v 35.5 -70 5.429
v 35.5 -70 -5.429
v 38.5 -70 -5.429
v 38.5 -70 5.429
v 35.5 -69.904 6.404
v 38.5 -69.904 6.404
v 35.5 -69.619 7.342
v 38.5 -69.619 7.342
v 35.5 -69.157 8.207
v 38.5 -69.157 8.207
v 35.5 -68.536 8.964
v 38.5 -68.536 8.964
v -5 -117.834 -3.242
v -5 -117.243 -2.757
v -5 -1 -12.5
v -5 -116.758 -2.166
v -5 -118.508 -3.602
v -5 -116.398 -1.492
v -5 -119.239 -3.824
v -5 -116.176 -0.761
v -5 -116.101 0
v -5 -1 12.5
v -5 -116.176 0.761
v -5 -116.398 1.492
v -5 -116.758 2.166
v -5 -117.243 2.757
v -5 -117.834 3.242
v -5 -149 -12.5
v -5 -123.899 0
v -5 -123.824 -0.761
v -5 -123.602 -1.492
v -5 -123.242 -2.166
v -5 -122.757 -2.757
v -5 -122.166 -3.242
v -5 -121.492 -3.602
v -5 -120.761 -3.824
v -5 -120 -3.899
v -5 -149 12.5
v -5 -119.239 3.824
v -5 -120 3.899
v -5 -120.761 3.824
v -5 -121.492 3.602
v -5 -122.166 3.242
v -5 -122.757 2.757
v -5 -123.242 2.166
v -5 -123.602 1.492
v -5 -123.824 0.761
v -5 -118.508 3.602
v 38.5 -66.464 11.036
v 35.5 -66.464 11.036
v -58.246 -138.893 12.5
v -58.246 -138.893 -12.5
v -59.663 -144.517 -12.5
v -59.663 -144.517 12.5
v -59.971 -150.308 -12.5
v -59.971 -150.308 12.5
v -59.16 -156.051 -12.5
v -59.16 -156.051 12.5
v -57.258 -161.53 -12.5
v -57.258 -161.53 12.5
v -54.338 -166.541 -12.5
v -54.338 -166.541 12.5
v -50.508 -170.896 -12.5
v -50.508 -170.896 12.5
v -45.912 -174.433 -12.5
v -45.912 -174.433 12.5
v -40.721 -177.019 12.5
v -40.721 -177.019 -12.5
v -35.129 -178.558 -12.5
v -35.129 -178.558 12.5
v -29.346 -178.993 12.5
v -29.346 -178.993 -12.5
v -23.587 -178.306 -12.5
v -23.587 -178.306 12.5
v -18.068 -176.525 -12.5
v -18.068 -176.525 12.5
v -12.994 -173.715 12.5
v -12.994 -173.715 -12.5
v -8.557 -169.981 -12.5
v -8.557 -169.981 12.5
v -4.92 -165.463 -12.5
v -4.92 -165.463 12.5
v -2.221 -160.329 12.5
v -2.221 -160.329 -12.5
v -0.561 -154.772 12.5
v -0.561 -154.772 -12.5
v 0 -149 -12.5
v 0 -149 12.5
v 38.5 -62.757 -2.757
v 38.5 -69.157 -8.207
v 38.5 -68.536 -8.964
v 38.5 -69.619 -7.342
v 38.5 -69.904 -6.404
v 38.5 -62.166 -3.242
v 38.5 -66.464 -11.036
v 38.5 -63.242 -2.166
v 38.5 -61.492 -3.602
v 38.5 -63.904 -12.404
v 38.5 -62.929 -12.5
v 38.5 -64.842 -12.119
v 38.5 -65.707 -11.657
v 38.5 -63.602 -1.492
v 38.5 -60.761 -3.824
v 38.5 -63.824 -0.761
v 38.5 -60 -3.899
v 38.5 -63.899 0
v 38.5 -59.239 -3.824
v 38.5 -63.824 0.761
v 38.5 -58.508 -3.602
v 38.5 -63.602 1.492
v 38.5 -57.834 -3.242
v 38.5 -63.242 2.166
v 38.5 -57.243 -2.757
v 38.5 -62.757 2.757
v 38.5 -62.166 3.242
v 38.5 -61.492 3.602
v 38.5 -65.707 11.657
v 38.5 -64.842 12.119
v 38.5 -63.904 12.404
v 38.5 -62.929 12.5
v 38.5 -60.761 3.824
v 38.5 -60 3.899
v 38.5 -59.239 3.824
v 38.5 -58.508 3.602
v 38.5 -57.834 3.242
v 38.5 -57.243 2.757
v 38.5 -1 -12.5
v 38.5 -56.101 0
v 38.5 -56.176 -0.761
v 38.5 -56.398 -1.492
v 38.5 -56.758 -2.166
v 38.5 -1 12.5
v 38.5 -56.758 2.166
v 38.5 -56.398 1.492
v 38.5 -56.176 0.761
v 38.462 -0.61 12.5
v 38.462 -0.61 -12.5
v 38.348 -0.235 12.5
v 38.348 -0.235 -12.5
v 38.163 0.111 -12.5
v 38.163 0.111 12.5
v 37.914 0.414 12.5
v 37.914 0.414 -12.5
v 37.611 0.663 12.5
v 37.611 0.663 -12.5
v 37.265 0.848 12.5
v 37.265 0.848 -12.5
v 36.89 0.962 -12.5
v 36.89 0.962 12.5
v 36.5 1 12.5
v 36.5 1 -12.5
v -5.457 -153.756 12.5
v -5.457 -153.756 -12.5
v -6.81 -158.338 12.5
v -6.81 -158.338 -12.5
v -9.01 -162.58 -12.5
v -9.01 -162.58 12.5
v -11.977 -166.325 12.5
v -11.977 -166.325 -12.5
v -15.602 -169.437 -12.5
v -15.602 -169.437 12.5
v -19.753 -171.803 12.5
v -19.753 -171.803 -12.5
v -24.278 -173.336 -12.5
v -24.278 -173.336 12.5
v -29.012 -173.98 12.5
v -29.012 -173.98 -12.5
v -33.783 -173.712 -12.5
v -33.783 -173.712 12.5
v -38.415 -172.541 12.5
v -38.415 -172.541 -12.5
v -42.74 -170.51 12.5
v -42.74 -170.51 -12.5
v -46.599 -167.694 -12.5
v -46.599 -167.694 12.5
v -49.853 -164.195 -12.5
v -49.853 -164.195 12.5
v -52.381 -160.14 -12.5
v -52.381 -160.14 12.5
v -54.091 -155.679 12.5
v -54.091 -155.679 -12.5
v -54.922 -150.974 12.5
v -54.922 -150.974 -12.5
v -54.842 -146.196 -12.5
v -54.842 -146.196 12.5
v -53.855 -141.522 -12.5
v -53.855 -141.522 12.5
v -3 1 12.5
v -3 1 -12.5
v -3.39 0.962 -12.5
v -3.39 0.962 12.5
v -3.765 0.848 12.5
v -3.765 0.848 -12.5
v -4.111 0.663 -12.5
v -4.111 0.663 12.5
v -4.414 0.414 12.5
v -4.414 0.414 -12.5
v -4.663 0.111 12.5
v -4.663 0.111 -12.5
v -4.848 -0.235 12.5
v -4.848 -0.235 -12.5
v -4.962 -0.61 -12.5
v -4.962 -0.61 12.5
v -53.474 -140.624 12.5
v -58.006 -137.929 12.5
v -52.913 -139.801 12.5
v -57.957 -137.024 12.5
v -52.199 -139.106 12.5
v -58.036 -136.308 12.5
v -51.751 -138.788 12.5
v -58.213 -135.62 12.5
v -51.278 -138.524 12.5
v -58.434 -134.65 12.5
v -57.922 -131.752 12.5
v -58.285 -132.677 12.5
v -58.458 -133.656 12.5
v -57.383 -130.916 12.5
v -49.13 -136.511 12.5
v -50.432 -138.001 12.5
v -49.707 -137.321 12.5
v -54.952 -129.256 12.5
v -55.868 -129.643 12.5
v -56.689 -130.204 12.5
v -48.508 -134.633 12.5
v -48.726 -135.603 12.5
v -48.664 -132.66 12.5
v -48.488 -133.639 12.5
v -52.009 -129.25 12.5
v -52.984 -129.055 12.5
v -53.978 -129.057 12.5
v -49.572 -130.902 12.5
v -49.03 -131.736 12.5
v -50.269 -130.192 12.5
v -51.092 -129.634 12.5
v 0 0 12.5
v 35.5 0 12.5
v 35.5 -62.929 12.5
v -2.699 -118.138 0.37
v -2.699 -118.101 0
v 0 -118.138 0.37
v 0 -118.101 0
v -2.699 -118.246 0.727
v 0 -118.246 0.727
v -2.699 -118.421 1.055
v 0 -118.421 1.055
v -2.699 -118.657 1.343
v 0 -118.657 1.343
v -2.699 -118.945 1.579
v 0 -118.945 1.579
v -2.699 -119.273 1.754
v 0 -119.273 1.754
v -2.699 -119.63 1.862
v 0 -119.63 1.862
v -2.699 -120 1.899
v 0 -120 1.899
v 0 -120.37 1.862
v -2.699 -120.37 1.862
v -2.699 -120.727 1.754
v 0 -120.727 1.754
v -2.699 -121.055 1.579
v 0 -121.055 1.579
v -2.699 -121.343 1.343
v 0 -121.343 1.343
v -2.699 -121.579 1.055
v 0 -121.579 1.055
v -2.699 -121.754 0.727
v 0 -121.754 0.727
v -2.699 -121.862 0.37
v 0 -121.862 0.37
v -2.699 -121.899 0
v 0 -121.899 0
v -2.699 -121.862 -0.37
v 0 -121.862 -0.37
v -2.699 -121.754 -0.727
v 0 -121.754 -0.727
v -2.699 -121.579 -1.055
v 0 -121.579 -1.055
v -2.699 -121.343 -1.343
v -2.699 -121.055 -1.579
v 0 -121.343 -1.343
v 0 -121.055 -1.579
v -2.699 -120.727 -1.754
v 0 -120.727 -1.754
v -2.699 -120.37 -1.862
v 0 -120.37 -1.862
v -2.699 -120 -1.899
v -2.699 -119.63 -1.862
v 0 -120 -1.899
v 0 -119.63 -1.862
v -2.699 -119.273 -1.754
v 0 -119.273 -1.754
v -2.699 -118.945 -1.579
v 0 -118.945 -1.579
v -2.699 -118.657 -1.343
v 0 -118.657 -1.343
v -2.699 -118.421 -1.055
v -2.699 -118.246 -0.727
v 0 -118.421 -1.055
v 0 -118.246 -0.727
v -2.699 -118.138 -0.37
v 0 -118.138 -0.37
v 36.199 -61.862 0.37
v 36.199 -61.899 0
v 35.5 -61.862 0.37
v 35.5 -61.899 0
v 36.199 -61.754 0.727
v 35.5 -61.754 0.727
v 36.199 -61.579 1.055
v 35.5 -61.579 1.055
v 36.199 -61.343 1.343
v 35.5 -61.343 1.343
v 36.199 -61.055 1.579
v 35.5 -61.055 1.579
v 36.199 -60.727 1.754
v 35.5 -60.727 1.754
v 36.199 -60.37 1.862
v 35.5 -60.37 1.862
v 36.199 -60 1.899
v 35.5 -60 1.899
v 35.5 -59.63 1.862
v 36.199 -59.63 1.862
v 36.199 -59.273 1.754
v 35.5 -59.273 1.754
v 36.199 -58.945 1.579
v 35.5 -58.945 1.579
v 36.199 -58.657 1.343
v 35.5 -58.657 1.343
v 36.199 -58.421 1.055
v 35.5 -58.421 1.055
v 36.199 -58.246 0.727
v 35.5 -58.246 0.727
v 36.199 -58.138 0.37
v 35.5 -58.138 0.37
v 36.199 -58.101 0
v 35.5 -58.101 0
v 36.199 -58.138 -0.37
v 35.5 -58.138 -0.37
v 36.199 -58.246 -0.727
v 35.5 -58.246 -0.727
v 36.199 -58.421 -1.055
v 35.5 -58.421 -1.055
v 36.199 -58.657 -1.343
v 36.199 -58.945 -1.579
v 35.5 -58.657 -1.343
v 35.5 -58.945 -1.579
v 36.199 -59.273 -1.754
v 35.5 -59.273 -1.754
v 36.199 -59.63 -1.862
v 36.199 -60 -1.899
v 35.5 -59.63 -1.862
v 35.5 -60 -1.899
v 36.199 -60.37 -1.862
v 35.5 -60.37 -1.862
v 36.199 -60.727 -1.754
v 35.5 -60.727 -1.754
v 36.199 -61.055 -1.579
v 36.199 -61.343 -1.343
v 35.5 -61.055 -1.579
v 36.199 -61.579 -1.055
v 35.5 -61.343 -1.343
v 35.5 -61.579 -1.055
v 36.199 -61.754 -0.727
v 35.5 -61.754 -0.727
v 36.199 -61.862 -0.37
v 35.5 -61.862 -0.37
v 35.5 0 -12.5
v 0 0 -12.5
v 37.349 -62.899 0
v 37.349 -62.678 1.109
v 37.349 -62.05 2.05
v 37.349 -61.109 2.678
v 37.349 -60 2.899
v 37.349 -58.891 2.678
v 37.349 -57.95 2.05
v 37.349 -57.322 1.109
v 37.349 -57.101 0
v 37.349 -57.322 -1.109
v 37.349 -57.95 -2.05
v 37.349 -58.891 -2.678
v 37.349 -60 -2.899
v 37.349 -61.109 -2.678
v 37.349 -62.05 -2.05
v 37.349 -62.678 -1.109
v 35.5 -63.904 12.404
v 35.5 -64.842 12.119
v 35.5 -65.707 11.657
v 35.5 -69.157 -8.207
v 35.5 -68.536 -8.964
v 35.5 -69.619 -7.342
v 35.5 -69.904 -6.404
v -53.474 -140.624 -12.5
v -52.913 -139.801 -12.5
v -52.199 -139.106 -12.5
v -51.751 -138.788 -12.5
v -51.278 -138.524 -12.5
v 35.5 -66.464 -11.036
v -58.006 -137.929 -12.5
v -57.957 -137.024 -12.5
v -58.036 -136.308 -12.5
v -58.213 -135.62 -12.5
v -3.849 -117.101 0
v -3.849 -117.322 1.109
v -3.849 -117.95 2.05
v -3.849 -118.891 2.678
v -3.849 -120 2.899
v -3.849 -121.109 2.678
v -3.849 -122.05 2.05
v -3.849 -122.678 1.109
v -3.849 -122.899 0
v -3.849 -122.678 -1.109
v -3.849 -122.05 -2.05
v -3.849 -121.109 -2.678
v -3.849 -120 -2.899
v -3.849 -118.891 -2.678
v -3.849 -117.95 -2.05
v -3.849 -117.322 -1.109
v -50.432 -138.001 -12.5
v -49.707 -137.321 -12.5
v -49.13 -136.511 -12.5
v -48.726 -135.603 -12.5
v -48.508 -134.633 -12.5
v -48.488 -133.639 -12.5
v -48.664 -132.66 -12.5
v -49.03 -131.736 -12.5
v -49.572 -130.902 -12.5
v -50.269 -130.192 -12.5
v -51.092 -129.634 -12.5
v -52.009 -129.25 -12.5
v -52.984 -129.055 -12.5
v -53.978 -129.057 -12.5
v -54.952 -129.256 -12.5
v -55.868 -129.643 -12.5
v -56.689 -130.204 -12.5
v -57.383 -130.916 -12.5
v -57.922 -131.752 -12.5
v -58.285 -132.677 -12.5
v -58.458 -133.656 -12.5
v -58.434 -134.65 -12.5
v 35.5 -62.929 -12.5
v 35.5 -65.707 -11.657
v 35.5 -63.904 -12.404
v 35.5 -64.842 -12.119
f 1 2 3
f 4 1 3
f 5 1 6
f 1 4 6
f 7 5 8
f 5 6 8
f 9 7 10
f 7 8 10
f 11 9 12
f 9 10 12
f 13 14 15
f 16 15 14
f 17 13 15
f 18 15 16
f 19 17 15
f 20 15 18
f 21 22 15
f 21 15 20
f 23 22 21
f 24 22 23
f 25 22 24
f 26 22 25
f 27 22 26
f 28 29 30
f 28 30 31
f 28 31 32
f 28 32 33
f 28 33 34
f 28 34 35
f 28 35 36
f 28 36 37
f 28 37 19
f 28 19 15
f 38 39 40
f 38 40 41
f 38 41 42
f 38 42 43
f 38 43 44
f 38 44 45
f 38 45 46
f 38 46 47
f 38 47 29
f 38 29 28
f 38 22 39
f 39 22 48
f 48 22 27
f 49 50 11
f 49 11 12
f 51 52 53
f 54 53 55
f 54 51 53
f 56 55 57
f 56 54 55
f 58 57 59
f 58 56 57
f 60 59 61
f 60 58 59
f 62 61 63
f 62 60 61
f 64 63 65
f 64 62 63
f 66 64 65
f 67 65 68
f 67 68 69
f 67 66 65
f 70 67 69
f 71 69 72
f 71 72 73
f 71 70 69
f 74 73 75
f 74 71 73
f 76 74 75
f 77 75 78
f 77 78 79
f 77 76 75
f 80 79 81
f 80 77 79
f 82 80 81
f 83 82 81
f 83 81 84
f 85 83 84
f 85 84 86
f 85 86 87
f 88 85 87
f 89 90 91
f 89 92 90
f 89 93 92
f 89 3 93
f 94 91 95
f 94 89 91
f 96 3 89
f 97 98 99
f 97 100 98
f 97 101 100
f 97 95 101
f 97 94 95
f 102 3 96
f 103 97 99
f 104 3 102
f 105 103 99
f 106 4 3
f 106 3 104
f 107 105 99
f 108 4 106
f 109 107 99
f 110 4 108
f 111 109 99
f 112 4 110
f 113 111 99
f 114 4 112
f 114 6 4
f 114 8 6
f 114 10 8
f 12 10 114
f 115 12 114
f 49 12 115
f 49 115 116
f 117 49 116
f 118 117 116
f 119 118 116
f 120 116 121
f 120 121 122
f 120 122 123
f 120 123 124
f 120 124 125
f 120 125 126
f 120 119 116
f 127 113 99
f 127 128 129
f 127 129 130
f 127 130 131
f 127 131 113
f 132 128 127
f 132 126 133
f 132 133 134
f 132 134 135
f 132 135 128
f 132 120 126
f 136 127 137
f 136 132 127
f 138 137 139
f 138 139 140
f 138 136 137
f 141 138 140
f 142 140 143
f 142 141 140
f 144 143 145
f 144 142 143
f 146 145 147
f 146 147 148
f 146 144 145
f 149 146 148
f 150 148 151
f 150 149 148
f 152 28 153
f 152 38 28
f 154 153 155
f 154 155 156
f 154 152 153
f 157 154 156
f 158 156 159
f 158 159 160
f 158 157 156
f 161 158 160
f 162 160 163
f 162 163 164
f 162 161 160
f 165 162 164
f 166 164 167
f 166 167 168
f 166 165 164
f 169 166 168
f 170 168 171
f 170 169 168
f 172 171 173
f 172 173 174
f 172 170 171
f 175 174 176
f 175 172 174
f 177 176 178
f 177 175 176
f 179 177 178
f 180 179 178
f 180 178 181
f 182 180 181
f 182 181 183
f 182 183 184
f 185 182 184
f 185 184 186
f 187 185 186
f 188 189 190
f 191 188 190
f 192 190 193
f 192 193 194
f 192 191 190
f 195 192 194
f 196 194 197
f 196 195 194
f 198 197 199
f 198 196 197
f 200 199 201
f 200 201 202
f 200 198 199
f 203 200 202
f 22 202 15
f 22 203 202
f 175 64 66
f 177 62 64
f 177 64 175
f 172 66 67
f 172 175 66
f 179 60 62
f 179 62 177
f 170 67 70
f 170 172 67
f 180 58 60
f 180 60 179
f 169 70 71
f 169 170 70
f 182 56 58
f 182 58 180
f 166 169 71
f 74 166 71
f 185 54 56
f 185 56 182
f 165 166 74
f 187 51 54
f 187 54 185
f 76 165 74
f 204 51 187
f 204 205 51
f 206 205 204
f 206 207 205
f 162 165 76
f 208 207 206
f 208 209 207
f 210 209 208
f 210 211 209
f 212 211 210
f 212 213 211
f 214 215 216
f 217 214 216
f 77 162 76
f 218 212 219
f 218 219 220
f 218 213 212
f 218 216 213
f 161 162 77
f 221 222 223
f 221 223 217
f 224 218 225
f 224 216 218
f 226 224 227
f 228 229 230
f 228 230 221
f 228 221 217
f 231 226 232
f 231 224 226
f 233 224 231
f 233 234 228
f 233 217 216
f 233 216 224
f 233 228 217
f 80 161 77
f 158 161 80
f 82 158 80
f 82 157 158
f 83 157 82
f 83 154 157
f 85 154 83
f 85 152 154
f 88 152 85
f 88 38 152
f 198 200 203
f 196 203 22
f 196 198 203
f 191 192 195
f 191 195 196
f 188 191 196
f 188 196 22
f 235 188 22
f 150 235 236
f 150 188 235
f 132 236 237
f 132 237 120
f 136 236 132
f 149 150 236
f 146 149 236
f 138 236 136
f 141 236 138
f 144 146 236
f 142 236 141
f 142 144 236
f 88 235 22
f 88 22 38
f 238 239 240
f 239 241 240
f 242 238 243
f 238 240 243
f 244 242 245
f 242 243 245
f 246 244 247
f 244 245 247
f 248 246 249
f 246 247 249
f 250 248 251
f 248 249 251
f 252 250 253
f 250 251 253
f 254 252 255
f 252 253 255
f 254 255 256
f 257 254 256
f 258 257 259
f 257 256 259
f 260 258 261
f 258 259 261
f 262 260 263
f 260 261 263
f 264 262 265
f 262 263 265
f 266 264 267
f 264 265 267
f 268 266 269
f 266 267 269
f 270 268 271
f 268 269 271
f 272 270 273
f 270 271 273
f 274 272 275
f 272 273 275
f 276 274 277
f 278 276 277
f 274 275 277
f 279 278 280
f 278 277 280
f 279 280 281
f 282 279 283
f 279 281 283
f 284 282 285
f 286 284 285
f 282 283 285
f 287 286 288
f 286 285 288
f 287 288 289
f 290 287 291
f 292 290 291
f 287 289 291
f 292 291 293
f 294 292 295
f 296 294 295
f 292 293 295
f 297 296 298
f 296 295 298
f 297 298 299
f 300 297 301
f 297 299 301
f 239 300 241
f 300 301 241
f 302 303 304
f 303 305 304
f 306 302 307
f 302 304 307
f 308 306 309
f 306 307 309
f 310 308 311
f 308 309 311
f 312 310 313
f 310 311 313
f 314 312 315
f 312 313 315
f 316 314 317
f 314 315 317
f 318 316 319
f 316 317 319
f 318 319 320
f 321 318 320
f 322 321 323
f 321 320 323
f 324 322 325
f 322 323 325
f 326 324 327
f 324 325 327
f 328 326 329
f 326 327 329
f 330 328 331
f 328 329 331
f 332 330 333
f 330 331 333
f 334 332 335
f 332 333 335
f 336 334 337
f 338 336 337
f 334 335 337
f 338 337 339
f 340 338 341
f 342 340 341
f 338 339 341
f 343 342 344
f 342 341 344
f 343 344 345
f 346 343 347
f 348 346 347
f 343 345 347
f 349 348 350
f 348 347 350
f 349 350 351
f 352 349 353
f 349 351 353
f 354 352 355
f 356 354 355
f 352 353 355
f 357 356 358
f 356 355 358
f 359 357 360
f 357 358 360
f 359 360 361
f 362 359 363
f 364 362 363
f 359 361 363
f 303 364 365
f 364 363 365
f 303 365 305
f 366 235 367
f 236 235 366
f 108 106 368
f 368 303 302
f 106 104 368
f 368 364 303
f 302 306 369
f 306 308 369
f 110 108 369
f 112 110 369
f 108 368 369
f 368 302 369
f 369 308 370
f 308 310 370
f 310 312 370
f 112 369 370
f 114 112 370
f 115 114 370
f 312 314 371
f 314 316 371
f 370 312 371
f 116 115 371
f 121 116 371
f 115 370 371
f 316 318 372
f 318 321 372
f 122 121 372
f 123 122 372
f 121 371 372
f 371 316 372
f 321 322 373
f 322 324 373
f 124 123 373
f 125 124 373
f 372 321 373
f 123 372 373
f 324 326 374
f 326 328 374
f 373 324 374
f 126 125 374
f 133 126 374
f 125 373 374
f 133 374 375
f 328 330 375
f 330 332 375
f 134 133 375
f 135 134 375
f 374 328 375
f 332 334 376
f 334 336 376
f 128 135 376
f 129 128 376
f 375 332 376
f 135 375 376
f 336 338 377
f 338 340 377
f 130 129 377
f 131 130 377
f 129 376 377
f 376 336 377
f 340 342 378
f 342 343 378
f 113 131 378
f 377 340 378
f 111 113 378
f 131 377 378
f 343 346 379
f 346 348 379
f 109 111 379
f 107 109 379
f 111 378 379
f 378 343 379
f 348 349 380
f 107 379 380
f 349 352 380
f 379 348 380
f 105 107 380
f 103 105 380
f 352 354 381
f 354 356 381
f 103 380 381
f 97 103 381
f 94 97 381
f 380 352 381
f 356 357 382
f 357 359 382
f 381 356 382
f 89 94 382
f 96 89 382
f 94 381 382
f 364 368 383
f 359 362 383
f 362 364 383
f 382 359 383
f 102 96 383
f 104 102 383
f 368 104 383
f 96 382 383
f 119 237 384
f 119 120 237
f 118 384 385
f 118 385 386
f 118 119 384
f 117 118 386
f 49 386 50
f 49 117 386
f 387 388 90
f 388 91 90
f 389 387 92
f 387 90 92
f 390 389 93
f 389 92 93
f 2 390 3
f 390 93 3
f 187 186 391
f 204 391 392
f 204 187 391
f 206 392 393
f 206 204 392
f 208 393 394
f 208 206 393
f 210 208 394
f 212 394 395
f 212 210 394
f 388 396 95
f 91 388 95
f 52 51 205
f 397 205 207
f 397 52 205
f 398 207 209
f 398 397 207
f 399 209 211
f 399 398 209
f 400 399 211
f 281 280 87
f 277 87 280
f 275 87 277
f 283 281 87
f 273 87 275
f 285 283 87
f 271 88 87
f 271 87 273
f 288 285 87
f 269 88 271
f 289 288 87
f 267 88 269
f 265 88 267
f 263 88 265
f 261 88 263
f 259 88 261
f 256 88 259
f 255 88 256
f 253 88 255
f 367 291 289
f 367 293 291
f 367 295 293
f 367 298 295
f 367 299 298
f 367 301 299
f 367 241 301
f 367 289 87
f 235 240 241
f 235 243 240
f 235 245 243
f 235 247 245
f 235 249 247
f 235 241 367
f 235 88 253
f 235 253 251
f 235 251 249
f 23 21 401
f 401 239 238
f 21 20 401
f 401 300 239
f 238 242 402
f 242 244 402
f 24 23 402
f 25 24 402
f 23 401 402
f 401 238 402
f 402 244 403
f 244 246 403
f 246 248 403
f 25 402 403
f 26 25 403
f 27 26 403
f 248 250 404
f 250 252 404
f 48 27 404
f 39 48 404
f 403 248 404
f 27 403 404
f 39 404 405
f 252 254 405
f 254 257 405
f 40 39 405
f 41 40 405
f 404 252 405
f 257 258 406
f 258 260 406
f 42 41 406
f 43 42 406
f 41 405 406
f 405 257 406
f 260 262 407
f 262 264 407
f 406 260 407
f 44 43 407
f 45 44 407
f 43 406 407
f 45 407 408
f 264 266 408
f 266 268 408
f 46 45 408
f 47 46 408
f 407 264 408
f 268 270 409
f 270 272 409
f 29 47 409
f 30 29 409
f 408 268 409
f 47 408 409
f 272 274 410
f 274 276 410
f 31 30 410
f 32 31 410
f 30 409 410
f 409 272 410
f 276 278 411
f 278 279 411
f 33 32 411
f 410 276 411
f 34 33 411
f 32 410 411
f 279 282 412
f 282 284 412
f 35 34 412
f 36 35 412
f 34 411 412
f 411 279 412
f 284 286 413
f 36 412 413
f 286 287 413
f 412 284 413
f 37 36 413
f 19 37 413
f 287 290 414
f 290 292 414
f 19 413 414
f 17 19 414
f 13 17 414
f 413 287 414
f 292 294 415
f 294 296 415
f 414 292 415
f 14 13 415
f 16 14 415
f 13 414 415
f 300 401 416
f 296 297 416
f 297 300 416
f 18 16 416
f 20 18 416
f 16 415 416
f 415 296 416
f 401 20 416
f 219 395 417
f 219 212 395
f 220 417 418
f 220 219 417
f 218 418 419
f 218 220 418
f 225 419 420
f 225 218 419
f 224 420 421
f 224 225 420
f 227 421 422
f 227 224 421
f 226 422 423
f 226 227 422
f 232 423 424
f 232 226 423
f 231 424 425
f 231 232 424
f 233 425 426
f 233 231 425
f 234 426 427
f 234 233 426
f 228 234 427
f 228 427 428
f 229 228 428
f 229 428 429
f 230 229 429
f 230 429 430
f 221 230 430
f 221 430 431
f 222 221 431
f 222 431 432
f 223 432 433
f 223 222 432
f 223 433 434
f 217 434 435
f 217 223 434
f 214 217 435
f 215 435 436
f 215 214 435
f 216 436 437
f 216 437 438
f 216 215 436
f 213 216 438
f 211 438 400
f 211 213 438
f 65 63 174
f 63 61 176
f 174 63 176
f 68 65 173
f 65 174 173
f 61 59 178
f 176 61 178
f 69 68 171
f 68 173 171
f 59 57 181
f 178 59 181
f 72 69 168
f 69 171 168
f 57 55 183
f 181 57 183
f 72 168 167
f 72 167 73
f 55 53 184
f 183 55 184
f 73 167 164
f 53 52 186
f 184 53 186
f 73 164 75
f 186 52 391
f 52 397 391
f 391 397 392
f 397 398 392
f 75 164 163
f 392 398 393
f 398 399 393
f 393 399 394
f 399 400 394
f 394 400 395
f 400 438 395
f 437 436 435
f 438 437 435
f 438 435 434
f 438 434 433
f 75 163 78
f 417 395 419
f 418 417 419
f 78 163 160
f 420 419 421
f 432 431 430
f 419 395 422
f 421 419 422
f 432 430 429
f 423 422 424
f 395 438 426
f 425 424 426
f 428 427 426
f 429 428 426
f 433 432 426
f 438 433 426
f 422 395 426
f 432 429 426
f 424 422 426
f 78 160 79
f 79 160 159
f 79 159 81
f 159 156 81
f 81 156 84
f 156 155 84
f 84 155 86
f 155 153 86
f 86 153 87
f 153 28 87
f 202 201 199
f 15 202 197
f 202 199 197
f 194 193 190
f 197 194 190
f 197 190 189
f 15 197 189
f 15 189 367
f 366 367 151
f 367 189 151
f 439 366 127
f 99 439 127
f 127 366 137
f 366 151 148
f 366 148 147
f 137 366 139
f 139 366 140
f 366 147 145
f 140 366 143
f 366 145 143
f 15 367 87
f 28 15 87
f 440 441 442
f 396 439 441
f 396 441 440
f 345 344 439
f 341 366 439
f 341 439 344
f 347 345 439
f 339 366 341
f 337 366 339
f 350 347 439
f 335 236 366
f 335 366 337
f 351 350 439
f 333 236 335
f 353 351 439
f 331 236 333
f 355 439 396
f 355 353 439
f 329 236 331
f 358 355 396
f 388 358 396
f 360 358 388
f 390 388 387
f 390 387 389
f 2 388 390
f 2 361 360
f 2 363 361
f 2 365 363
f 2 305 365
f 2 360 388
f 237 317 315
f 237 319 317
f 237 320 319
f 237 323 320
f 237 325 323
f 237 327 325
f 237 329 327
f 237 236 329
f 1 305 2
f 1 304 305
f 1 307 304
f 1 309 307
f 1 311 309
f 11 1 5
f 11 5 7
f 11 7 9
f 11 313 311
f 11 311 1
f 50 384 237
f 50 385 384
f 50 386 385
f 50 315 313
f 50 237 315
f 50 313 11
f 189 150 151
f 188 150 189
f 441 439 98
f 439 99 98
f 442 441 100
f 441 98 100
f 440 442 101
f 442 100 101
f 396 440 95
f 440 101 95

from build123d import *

# Parameters (mm, degrees)
F1_DEPTH             = 12.5
F2_SIZE              = 5
F3_R                 = 2
F4_R                 = 5
F6_R                 = 5
F8_D                 = 3.7973
F8_DEPTH             = 12.62
F8_CSINK_D           = 7.7978
F8_CSINK_ANGLE       = 82
F8_TIP               = 1.1408240143
F8_ON_F7_D           = 3.7973
F8_ON_F7_DEPTH       = 12.62
F8_ON_F7_CSINK_D     = 7.7978
F8_ON_F7_CSINK_ANGLE = 82
F8_ON_F7_TIP         = 1.1408240143


with BuildPart() as f1:
    # F0 (on Top) → F1 (new body, symmetric)
    with BuildSketch(Plane.XY):
        with BuildLine():
            Line((0, 0), (35.5, 0))
            Line((35.5, 0), (35.5, -70))
            Line((35.5, -70), (38.5, -70))
            Line((38.5, -70), (38.5, 1))
            Line((38.5, 1), (-5, 1))
            Line((-5, 1), (-5, -149))
            ThreePointArc((-5, -149), (-35.1077410922, -173.4726578233), (-52.9128784748, -139))
            ThreePointArc((-52.9128784748, -139), (-51.4721155147, -129.4487973384), (-57.4954541697, -137))
            ThreePointArc((-57.4954541697, -137), (-36.1292893107, -178.3671893879), (0, -149))
            Line((0, -149), (0, 0))
        make_face()
    extrude(amount=F1_DEPTH, both=True)

    # F2
    f2_edges = [f1.edges().sort_by_distance(p)[0] for p in [
        (37, -70, 12.5),
        (37, -70, -12.5),
    ]]
    chamfer(f2_edges, length=F2_SIZE)

    # F3
    f3_edges = [f1.edges().sort_by_distance(p)[0] for p in [
        (-5, 1, 0),
        (38.5, 1, 0),
    ]]
    fillet(f3_edges, radius=F3_R)

    # F4
    f4_edges = [f1.edges().sort_by_distance(p)[0] for p in [
        (37, -65, 12.5),
        (37, -70, 7.5),
        (37, -65, -12.5),
        (37, -70, -7.5),
    ]]
    fillet(f4_edges, radius=F4_R)

    # F6
    f6_edges = [f1.edges().sort_by_distance(p)[0] for p in [
        (-57.495454, -137, 0),
        (-52.912878, -139, 0),
    ]]
    fillet(f6_edges, radius=F6_R)

    # F8
    with Locations(Plane(origin=(-5, 0, 0), x_dir=(0, -1, 0), z_dir=(-1, 0, 0))):
        with Locations((120, 0)):
            CounterSinkHole(F8_D / 2, F8_CSINK_D / 2, depth=F8_DEPTH, counter_sink_angle=F8_CSINK_ANGLE)
            with Locations((0, 0, -(F8_DEPTH + F8_TIP / 2))):  # 118° drill point
                Cone(0, F8_D / 2, F8_TIP, mode=Mode.SUBTRACT)

    # F8 on F7
    with Locations(Plane.YZ.offset(38.5)):
        with Locations((-60, 0)):
            CounterSinkHole(F8_ON_F7_D / 2, F8_ON_F7_CSINK_D / 2, depth=F8_ON_F7_DEPTH, counter_sink_angle=F8_ON_F7_CSINK_ANGLE)
            with Locations((0, 0, -(F8_ON_F7_DEPTH + F8_ON_F7_TIP / 2))):  # 118° drill point
                Cone(0, F8_ON_F7_D / 2, F8_ON_F7_TIP, mode=Mode.SUBTRACT)


solid = f1.part
